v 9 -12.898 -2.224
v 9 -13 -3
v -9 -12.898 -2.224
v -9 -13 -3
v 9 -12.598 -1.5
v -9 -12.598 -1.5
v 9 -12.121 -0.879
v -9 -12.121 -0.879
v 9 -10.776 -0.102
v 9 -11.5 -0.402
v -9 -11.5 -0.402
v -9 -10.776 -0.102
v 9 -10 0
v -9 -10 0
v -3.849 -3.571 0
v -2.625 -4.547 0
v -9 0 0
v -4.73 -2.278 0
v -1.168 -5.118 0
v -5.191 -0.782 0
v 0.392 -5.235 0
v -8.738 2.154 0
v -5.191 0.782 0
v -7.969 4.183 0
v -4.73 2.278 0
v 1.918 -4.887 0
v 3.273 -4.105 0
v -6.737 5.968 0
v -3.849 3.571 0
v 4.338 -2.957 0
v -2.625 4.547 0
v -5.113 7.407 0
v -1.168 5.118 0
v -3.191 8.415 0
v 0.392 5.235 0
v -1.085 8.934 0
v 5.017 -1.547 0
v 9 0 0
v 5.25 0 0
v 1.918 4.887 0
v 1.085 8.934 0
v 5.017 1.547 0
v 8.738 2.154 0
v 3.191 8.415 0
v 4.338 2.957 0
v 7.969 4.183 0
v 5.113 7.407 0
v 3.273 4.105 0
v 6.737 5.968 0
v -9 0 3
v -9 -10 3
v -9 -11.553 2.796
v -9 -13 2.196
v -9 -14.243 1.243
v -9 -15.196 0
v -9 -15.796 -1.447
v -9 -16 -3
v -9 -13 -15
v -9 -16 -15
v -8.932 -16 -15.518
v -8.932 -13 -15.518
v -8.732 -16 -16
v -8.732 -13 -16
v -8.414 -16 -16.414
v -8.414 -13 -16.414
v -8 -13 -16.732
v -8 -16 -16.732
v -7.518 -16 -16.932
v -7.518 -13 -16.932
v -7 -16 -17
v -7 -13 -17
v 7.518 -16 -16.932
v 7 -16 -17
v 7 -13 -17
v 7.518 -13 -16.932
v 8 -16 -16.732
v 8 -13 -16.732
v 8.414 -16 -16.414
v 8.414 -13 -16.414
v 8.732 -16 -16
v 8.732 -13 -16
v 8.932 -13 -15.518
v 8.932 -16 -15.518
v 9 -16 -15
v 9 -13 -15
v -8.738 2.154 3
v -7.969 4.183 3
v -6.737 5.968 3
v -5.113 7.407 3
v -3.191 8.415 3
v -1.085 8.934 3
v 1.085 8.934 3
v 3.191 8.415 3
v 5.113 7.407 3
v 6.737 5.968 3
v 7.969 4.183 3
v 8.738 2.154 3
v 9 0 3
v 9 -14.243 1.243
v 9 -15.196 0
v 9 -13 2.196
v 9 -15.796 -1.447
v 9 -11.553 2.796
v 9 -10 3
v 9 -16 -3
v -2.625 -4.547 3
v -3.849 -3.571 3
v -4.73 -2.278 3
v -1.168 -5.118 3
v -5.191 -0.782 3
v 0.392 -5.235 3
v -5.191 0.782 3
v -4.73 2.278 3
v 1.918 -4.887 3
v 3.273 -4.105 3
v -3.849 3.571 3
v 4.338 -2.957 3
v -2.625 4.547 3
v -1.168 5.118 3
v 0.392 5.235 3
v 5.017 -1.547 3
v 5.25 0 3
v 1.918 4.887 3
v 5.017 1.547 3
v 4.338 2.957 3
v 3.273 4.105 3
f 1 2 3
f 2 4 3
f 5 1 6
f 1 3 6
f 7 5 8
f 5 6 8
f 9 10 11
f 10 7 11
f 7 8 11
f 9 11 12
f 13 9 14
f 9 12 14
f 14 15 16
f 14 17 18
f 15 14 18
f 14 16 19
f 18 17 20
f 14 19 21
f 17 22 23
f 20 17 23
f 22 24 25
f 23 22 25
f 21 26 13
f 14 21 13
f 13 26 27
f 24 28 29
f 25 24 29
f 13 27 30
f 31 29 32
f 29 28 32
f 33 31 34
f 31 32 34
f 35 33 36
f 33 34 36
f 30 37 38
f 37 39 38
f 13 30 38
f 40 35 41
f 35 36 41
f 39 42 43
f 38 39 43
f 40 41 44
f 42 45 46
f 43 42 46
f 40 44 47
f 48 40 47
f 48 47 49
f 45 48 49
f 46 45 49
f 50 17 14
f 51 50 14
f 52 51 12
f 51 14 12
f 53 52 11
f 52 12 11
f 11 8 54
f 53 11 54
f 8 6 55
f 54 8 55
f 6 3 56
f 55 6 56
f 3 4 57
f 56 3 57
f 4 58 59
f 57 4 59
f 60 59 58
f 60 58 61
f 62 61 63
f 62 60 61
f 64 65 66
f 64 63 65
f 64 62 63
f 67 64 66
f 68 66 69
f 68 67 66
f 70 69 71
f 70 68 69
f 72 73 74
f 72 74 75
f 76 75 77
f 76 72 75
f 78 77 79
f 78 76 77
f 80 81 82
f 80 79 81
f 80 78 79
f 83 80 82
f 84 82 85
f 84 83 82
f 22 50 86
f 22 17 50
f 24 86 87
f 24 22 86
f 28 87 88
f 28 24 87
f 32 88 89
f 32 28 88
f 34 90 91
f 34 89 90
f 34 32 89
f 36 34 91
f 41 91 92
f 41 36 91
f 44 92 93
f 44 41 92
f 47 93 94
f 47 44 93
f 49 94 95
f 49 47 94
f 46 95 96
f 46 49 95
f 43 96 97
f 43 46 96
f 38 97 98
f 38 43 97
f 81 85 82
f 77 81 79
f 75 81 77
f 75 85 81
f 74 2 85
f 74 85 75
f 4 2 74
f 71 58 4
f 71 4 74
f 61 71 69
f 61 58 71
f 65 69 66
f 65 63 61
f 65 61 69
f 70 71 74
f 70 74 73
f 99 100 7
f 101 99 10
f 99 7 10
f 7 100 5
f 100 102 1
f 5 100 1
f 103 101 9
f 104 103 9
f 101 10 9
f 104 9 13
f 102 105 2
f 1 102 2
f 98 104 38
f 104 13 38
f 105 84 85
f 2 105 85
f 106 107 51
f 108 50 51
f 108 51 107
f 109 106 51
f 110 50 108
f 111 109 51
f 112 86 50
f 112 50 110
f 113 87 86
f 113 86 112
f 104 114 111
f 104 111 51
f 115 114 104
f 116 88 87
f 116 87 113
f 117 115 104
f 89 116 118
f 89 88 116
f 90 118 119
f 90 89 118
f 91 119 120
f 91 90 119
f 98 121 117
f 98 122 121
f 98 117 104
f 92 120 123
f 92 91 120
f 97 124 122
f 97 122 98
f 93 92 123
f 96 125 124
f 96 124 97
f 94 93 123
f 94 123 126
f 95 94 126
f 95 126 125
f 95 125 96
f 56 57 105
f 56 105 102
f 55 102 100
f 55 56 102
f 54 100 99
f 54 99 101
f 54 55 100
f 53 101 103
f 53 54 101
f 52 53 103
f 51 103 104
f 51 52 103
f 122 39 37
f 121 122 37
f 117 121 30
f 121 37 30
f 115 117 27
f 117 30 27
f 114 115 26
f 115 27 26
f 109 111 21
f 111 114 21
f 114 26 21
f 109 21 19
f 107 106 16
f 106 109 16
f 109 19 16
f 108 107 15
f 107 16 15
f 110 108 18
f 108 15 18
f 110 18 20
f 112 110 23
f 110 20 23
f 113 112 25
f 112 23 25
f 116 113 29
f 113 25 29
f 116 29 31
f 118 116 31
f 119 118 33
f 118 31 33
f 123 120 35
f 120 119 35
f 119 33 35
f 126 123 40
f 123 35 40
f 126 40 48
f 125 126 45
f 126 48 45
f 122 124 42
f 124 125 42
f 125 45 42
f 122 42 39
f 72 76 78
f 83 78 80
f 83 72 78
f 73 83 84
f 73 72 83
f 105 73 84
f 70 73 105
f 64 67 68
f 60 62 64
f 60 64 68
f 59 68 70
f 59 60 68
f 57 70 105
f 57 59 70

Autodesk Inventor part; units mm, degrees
ref_plane "YZ Plane" through (0, 0, 0) normal (1, 0, 0) x (0, 1, 0)
ref_plane "XZ Plane" through (0, 0, 0) normal (0, 1, 0) x (-1, 0, 0)
ref_plane "XY Plane" through (0, 0, 0) normal (0, 0, 1) x (1, 0, 0)
sketch "Schizzo1" plane through (0, 0, 0) normal (0, 0, 1) x (1, 0, 0)
  circle A0 centre (0, 0) radius 5.25
  arc A1 (9, 0) -> (-9, 0) centre (0, 0) ccw
  line L0 (-9, 0) -> (-9, -10)
  line L1 (-9, -10) -> (9, -10)
  line L2 (9, -10) -> (9, 0)
  dimension "d0" = 10.5
  dimension "d1" = 18
  dimension "d2" = 10
extrude "Piano1" add sketch "Schizzo1" along normal blind 3
sketch "Schizzo2" plane through (-9, -13, -3) normal (0, -1, 0) x (1, 0, 0)
  line L0 (18, 0) -> (0, 0)
  line L1 (0, 0) -> (0, -14)
  line L2 (0, -14) -> (18, -14)
  line L3 (18, -14) -> (18, 0)
edge flange "Flangia1" height 20 angle 90 thickness 3 bend radius 3 thickness toward (0, -1, 0) relief tear relief width 3 relief depth 1.5 edges at (0, -10, 0) wall of the first edge with corners at (9, -13, -3) (-9, -13, -3) (-9, -13, -17) (9, -13, -17)
bend "Piega (Bend)1"
corner "Angolo1"
fillet "Arrotondamento angolo1" radius 2 2 edges at (9, -14.5, -17) (-9, -14.5, -17)
equation "\"d3\" = Spessore"
equation "\"d4\" = LarghezzaScaricoPiega"
equation "\"d5\" = ProfonditàScaricoPiega"
equation "\"d6\" = ResiduoMinimo"
equation "\"d7\" = RaggioTransizione"
equation "\"d10\" = RaggioPiega"
equation "\"d11\" = DimensioniScaricoAngolo"
equation "\"d12\" = DimensioneGioco"
equation "\"d13\" = Dimensione_raggio_Jacobi"
equation "\"RaggioPiega\" = Spessore"
equation "\"LarghezzaScaricoPiega\" = Spessore"
equation "\"ProfonditàScaricoPiega\" = 0.5 * Spessore"
equation "\"DimensioniScaricoAngolo\" = 4 * Spessore"
equation "\"ResiduoMinimo\" = 2 * Spessore"
equation "\"RaggioTransizione\" = RaggioPiega"
equation "\"Dimensione_raggio_Jacobi\" = RaggioPiega"
equation "\"DimensioneGioco\" = Spessore"
equation "\"Spessore\" = 3"
properties part number "Supporto perno tendi motore" material "Acciaio inossidabile"
